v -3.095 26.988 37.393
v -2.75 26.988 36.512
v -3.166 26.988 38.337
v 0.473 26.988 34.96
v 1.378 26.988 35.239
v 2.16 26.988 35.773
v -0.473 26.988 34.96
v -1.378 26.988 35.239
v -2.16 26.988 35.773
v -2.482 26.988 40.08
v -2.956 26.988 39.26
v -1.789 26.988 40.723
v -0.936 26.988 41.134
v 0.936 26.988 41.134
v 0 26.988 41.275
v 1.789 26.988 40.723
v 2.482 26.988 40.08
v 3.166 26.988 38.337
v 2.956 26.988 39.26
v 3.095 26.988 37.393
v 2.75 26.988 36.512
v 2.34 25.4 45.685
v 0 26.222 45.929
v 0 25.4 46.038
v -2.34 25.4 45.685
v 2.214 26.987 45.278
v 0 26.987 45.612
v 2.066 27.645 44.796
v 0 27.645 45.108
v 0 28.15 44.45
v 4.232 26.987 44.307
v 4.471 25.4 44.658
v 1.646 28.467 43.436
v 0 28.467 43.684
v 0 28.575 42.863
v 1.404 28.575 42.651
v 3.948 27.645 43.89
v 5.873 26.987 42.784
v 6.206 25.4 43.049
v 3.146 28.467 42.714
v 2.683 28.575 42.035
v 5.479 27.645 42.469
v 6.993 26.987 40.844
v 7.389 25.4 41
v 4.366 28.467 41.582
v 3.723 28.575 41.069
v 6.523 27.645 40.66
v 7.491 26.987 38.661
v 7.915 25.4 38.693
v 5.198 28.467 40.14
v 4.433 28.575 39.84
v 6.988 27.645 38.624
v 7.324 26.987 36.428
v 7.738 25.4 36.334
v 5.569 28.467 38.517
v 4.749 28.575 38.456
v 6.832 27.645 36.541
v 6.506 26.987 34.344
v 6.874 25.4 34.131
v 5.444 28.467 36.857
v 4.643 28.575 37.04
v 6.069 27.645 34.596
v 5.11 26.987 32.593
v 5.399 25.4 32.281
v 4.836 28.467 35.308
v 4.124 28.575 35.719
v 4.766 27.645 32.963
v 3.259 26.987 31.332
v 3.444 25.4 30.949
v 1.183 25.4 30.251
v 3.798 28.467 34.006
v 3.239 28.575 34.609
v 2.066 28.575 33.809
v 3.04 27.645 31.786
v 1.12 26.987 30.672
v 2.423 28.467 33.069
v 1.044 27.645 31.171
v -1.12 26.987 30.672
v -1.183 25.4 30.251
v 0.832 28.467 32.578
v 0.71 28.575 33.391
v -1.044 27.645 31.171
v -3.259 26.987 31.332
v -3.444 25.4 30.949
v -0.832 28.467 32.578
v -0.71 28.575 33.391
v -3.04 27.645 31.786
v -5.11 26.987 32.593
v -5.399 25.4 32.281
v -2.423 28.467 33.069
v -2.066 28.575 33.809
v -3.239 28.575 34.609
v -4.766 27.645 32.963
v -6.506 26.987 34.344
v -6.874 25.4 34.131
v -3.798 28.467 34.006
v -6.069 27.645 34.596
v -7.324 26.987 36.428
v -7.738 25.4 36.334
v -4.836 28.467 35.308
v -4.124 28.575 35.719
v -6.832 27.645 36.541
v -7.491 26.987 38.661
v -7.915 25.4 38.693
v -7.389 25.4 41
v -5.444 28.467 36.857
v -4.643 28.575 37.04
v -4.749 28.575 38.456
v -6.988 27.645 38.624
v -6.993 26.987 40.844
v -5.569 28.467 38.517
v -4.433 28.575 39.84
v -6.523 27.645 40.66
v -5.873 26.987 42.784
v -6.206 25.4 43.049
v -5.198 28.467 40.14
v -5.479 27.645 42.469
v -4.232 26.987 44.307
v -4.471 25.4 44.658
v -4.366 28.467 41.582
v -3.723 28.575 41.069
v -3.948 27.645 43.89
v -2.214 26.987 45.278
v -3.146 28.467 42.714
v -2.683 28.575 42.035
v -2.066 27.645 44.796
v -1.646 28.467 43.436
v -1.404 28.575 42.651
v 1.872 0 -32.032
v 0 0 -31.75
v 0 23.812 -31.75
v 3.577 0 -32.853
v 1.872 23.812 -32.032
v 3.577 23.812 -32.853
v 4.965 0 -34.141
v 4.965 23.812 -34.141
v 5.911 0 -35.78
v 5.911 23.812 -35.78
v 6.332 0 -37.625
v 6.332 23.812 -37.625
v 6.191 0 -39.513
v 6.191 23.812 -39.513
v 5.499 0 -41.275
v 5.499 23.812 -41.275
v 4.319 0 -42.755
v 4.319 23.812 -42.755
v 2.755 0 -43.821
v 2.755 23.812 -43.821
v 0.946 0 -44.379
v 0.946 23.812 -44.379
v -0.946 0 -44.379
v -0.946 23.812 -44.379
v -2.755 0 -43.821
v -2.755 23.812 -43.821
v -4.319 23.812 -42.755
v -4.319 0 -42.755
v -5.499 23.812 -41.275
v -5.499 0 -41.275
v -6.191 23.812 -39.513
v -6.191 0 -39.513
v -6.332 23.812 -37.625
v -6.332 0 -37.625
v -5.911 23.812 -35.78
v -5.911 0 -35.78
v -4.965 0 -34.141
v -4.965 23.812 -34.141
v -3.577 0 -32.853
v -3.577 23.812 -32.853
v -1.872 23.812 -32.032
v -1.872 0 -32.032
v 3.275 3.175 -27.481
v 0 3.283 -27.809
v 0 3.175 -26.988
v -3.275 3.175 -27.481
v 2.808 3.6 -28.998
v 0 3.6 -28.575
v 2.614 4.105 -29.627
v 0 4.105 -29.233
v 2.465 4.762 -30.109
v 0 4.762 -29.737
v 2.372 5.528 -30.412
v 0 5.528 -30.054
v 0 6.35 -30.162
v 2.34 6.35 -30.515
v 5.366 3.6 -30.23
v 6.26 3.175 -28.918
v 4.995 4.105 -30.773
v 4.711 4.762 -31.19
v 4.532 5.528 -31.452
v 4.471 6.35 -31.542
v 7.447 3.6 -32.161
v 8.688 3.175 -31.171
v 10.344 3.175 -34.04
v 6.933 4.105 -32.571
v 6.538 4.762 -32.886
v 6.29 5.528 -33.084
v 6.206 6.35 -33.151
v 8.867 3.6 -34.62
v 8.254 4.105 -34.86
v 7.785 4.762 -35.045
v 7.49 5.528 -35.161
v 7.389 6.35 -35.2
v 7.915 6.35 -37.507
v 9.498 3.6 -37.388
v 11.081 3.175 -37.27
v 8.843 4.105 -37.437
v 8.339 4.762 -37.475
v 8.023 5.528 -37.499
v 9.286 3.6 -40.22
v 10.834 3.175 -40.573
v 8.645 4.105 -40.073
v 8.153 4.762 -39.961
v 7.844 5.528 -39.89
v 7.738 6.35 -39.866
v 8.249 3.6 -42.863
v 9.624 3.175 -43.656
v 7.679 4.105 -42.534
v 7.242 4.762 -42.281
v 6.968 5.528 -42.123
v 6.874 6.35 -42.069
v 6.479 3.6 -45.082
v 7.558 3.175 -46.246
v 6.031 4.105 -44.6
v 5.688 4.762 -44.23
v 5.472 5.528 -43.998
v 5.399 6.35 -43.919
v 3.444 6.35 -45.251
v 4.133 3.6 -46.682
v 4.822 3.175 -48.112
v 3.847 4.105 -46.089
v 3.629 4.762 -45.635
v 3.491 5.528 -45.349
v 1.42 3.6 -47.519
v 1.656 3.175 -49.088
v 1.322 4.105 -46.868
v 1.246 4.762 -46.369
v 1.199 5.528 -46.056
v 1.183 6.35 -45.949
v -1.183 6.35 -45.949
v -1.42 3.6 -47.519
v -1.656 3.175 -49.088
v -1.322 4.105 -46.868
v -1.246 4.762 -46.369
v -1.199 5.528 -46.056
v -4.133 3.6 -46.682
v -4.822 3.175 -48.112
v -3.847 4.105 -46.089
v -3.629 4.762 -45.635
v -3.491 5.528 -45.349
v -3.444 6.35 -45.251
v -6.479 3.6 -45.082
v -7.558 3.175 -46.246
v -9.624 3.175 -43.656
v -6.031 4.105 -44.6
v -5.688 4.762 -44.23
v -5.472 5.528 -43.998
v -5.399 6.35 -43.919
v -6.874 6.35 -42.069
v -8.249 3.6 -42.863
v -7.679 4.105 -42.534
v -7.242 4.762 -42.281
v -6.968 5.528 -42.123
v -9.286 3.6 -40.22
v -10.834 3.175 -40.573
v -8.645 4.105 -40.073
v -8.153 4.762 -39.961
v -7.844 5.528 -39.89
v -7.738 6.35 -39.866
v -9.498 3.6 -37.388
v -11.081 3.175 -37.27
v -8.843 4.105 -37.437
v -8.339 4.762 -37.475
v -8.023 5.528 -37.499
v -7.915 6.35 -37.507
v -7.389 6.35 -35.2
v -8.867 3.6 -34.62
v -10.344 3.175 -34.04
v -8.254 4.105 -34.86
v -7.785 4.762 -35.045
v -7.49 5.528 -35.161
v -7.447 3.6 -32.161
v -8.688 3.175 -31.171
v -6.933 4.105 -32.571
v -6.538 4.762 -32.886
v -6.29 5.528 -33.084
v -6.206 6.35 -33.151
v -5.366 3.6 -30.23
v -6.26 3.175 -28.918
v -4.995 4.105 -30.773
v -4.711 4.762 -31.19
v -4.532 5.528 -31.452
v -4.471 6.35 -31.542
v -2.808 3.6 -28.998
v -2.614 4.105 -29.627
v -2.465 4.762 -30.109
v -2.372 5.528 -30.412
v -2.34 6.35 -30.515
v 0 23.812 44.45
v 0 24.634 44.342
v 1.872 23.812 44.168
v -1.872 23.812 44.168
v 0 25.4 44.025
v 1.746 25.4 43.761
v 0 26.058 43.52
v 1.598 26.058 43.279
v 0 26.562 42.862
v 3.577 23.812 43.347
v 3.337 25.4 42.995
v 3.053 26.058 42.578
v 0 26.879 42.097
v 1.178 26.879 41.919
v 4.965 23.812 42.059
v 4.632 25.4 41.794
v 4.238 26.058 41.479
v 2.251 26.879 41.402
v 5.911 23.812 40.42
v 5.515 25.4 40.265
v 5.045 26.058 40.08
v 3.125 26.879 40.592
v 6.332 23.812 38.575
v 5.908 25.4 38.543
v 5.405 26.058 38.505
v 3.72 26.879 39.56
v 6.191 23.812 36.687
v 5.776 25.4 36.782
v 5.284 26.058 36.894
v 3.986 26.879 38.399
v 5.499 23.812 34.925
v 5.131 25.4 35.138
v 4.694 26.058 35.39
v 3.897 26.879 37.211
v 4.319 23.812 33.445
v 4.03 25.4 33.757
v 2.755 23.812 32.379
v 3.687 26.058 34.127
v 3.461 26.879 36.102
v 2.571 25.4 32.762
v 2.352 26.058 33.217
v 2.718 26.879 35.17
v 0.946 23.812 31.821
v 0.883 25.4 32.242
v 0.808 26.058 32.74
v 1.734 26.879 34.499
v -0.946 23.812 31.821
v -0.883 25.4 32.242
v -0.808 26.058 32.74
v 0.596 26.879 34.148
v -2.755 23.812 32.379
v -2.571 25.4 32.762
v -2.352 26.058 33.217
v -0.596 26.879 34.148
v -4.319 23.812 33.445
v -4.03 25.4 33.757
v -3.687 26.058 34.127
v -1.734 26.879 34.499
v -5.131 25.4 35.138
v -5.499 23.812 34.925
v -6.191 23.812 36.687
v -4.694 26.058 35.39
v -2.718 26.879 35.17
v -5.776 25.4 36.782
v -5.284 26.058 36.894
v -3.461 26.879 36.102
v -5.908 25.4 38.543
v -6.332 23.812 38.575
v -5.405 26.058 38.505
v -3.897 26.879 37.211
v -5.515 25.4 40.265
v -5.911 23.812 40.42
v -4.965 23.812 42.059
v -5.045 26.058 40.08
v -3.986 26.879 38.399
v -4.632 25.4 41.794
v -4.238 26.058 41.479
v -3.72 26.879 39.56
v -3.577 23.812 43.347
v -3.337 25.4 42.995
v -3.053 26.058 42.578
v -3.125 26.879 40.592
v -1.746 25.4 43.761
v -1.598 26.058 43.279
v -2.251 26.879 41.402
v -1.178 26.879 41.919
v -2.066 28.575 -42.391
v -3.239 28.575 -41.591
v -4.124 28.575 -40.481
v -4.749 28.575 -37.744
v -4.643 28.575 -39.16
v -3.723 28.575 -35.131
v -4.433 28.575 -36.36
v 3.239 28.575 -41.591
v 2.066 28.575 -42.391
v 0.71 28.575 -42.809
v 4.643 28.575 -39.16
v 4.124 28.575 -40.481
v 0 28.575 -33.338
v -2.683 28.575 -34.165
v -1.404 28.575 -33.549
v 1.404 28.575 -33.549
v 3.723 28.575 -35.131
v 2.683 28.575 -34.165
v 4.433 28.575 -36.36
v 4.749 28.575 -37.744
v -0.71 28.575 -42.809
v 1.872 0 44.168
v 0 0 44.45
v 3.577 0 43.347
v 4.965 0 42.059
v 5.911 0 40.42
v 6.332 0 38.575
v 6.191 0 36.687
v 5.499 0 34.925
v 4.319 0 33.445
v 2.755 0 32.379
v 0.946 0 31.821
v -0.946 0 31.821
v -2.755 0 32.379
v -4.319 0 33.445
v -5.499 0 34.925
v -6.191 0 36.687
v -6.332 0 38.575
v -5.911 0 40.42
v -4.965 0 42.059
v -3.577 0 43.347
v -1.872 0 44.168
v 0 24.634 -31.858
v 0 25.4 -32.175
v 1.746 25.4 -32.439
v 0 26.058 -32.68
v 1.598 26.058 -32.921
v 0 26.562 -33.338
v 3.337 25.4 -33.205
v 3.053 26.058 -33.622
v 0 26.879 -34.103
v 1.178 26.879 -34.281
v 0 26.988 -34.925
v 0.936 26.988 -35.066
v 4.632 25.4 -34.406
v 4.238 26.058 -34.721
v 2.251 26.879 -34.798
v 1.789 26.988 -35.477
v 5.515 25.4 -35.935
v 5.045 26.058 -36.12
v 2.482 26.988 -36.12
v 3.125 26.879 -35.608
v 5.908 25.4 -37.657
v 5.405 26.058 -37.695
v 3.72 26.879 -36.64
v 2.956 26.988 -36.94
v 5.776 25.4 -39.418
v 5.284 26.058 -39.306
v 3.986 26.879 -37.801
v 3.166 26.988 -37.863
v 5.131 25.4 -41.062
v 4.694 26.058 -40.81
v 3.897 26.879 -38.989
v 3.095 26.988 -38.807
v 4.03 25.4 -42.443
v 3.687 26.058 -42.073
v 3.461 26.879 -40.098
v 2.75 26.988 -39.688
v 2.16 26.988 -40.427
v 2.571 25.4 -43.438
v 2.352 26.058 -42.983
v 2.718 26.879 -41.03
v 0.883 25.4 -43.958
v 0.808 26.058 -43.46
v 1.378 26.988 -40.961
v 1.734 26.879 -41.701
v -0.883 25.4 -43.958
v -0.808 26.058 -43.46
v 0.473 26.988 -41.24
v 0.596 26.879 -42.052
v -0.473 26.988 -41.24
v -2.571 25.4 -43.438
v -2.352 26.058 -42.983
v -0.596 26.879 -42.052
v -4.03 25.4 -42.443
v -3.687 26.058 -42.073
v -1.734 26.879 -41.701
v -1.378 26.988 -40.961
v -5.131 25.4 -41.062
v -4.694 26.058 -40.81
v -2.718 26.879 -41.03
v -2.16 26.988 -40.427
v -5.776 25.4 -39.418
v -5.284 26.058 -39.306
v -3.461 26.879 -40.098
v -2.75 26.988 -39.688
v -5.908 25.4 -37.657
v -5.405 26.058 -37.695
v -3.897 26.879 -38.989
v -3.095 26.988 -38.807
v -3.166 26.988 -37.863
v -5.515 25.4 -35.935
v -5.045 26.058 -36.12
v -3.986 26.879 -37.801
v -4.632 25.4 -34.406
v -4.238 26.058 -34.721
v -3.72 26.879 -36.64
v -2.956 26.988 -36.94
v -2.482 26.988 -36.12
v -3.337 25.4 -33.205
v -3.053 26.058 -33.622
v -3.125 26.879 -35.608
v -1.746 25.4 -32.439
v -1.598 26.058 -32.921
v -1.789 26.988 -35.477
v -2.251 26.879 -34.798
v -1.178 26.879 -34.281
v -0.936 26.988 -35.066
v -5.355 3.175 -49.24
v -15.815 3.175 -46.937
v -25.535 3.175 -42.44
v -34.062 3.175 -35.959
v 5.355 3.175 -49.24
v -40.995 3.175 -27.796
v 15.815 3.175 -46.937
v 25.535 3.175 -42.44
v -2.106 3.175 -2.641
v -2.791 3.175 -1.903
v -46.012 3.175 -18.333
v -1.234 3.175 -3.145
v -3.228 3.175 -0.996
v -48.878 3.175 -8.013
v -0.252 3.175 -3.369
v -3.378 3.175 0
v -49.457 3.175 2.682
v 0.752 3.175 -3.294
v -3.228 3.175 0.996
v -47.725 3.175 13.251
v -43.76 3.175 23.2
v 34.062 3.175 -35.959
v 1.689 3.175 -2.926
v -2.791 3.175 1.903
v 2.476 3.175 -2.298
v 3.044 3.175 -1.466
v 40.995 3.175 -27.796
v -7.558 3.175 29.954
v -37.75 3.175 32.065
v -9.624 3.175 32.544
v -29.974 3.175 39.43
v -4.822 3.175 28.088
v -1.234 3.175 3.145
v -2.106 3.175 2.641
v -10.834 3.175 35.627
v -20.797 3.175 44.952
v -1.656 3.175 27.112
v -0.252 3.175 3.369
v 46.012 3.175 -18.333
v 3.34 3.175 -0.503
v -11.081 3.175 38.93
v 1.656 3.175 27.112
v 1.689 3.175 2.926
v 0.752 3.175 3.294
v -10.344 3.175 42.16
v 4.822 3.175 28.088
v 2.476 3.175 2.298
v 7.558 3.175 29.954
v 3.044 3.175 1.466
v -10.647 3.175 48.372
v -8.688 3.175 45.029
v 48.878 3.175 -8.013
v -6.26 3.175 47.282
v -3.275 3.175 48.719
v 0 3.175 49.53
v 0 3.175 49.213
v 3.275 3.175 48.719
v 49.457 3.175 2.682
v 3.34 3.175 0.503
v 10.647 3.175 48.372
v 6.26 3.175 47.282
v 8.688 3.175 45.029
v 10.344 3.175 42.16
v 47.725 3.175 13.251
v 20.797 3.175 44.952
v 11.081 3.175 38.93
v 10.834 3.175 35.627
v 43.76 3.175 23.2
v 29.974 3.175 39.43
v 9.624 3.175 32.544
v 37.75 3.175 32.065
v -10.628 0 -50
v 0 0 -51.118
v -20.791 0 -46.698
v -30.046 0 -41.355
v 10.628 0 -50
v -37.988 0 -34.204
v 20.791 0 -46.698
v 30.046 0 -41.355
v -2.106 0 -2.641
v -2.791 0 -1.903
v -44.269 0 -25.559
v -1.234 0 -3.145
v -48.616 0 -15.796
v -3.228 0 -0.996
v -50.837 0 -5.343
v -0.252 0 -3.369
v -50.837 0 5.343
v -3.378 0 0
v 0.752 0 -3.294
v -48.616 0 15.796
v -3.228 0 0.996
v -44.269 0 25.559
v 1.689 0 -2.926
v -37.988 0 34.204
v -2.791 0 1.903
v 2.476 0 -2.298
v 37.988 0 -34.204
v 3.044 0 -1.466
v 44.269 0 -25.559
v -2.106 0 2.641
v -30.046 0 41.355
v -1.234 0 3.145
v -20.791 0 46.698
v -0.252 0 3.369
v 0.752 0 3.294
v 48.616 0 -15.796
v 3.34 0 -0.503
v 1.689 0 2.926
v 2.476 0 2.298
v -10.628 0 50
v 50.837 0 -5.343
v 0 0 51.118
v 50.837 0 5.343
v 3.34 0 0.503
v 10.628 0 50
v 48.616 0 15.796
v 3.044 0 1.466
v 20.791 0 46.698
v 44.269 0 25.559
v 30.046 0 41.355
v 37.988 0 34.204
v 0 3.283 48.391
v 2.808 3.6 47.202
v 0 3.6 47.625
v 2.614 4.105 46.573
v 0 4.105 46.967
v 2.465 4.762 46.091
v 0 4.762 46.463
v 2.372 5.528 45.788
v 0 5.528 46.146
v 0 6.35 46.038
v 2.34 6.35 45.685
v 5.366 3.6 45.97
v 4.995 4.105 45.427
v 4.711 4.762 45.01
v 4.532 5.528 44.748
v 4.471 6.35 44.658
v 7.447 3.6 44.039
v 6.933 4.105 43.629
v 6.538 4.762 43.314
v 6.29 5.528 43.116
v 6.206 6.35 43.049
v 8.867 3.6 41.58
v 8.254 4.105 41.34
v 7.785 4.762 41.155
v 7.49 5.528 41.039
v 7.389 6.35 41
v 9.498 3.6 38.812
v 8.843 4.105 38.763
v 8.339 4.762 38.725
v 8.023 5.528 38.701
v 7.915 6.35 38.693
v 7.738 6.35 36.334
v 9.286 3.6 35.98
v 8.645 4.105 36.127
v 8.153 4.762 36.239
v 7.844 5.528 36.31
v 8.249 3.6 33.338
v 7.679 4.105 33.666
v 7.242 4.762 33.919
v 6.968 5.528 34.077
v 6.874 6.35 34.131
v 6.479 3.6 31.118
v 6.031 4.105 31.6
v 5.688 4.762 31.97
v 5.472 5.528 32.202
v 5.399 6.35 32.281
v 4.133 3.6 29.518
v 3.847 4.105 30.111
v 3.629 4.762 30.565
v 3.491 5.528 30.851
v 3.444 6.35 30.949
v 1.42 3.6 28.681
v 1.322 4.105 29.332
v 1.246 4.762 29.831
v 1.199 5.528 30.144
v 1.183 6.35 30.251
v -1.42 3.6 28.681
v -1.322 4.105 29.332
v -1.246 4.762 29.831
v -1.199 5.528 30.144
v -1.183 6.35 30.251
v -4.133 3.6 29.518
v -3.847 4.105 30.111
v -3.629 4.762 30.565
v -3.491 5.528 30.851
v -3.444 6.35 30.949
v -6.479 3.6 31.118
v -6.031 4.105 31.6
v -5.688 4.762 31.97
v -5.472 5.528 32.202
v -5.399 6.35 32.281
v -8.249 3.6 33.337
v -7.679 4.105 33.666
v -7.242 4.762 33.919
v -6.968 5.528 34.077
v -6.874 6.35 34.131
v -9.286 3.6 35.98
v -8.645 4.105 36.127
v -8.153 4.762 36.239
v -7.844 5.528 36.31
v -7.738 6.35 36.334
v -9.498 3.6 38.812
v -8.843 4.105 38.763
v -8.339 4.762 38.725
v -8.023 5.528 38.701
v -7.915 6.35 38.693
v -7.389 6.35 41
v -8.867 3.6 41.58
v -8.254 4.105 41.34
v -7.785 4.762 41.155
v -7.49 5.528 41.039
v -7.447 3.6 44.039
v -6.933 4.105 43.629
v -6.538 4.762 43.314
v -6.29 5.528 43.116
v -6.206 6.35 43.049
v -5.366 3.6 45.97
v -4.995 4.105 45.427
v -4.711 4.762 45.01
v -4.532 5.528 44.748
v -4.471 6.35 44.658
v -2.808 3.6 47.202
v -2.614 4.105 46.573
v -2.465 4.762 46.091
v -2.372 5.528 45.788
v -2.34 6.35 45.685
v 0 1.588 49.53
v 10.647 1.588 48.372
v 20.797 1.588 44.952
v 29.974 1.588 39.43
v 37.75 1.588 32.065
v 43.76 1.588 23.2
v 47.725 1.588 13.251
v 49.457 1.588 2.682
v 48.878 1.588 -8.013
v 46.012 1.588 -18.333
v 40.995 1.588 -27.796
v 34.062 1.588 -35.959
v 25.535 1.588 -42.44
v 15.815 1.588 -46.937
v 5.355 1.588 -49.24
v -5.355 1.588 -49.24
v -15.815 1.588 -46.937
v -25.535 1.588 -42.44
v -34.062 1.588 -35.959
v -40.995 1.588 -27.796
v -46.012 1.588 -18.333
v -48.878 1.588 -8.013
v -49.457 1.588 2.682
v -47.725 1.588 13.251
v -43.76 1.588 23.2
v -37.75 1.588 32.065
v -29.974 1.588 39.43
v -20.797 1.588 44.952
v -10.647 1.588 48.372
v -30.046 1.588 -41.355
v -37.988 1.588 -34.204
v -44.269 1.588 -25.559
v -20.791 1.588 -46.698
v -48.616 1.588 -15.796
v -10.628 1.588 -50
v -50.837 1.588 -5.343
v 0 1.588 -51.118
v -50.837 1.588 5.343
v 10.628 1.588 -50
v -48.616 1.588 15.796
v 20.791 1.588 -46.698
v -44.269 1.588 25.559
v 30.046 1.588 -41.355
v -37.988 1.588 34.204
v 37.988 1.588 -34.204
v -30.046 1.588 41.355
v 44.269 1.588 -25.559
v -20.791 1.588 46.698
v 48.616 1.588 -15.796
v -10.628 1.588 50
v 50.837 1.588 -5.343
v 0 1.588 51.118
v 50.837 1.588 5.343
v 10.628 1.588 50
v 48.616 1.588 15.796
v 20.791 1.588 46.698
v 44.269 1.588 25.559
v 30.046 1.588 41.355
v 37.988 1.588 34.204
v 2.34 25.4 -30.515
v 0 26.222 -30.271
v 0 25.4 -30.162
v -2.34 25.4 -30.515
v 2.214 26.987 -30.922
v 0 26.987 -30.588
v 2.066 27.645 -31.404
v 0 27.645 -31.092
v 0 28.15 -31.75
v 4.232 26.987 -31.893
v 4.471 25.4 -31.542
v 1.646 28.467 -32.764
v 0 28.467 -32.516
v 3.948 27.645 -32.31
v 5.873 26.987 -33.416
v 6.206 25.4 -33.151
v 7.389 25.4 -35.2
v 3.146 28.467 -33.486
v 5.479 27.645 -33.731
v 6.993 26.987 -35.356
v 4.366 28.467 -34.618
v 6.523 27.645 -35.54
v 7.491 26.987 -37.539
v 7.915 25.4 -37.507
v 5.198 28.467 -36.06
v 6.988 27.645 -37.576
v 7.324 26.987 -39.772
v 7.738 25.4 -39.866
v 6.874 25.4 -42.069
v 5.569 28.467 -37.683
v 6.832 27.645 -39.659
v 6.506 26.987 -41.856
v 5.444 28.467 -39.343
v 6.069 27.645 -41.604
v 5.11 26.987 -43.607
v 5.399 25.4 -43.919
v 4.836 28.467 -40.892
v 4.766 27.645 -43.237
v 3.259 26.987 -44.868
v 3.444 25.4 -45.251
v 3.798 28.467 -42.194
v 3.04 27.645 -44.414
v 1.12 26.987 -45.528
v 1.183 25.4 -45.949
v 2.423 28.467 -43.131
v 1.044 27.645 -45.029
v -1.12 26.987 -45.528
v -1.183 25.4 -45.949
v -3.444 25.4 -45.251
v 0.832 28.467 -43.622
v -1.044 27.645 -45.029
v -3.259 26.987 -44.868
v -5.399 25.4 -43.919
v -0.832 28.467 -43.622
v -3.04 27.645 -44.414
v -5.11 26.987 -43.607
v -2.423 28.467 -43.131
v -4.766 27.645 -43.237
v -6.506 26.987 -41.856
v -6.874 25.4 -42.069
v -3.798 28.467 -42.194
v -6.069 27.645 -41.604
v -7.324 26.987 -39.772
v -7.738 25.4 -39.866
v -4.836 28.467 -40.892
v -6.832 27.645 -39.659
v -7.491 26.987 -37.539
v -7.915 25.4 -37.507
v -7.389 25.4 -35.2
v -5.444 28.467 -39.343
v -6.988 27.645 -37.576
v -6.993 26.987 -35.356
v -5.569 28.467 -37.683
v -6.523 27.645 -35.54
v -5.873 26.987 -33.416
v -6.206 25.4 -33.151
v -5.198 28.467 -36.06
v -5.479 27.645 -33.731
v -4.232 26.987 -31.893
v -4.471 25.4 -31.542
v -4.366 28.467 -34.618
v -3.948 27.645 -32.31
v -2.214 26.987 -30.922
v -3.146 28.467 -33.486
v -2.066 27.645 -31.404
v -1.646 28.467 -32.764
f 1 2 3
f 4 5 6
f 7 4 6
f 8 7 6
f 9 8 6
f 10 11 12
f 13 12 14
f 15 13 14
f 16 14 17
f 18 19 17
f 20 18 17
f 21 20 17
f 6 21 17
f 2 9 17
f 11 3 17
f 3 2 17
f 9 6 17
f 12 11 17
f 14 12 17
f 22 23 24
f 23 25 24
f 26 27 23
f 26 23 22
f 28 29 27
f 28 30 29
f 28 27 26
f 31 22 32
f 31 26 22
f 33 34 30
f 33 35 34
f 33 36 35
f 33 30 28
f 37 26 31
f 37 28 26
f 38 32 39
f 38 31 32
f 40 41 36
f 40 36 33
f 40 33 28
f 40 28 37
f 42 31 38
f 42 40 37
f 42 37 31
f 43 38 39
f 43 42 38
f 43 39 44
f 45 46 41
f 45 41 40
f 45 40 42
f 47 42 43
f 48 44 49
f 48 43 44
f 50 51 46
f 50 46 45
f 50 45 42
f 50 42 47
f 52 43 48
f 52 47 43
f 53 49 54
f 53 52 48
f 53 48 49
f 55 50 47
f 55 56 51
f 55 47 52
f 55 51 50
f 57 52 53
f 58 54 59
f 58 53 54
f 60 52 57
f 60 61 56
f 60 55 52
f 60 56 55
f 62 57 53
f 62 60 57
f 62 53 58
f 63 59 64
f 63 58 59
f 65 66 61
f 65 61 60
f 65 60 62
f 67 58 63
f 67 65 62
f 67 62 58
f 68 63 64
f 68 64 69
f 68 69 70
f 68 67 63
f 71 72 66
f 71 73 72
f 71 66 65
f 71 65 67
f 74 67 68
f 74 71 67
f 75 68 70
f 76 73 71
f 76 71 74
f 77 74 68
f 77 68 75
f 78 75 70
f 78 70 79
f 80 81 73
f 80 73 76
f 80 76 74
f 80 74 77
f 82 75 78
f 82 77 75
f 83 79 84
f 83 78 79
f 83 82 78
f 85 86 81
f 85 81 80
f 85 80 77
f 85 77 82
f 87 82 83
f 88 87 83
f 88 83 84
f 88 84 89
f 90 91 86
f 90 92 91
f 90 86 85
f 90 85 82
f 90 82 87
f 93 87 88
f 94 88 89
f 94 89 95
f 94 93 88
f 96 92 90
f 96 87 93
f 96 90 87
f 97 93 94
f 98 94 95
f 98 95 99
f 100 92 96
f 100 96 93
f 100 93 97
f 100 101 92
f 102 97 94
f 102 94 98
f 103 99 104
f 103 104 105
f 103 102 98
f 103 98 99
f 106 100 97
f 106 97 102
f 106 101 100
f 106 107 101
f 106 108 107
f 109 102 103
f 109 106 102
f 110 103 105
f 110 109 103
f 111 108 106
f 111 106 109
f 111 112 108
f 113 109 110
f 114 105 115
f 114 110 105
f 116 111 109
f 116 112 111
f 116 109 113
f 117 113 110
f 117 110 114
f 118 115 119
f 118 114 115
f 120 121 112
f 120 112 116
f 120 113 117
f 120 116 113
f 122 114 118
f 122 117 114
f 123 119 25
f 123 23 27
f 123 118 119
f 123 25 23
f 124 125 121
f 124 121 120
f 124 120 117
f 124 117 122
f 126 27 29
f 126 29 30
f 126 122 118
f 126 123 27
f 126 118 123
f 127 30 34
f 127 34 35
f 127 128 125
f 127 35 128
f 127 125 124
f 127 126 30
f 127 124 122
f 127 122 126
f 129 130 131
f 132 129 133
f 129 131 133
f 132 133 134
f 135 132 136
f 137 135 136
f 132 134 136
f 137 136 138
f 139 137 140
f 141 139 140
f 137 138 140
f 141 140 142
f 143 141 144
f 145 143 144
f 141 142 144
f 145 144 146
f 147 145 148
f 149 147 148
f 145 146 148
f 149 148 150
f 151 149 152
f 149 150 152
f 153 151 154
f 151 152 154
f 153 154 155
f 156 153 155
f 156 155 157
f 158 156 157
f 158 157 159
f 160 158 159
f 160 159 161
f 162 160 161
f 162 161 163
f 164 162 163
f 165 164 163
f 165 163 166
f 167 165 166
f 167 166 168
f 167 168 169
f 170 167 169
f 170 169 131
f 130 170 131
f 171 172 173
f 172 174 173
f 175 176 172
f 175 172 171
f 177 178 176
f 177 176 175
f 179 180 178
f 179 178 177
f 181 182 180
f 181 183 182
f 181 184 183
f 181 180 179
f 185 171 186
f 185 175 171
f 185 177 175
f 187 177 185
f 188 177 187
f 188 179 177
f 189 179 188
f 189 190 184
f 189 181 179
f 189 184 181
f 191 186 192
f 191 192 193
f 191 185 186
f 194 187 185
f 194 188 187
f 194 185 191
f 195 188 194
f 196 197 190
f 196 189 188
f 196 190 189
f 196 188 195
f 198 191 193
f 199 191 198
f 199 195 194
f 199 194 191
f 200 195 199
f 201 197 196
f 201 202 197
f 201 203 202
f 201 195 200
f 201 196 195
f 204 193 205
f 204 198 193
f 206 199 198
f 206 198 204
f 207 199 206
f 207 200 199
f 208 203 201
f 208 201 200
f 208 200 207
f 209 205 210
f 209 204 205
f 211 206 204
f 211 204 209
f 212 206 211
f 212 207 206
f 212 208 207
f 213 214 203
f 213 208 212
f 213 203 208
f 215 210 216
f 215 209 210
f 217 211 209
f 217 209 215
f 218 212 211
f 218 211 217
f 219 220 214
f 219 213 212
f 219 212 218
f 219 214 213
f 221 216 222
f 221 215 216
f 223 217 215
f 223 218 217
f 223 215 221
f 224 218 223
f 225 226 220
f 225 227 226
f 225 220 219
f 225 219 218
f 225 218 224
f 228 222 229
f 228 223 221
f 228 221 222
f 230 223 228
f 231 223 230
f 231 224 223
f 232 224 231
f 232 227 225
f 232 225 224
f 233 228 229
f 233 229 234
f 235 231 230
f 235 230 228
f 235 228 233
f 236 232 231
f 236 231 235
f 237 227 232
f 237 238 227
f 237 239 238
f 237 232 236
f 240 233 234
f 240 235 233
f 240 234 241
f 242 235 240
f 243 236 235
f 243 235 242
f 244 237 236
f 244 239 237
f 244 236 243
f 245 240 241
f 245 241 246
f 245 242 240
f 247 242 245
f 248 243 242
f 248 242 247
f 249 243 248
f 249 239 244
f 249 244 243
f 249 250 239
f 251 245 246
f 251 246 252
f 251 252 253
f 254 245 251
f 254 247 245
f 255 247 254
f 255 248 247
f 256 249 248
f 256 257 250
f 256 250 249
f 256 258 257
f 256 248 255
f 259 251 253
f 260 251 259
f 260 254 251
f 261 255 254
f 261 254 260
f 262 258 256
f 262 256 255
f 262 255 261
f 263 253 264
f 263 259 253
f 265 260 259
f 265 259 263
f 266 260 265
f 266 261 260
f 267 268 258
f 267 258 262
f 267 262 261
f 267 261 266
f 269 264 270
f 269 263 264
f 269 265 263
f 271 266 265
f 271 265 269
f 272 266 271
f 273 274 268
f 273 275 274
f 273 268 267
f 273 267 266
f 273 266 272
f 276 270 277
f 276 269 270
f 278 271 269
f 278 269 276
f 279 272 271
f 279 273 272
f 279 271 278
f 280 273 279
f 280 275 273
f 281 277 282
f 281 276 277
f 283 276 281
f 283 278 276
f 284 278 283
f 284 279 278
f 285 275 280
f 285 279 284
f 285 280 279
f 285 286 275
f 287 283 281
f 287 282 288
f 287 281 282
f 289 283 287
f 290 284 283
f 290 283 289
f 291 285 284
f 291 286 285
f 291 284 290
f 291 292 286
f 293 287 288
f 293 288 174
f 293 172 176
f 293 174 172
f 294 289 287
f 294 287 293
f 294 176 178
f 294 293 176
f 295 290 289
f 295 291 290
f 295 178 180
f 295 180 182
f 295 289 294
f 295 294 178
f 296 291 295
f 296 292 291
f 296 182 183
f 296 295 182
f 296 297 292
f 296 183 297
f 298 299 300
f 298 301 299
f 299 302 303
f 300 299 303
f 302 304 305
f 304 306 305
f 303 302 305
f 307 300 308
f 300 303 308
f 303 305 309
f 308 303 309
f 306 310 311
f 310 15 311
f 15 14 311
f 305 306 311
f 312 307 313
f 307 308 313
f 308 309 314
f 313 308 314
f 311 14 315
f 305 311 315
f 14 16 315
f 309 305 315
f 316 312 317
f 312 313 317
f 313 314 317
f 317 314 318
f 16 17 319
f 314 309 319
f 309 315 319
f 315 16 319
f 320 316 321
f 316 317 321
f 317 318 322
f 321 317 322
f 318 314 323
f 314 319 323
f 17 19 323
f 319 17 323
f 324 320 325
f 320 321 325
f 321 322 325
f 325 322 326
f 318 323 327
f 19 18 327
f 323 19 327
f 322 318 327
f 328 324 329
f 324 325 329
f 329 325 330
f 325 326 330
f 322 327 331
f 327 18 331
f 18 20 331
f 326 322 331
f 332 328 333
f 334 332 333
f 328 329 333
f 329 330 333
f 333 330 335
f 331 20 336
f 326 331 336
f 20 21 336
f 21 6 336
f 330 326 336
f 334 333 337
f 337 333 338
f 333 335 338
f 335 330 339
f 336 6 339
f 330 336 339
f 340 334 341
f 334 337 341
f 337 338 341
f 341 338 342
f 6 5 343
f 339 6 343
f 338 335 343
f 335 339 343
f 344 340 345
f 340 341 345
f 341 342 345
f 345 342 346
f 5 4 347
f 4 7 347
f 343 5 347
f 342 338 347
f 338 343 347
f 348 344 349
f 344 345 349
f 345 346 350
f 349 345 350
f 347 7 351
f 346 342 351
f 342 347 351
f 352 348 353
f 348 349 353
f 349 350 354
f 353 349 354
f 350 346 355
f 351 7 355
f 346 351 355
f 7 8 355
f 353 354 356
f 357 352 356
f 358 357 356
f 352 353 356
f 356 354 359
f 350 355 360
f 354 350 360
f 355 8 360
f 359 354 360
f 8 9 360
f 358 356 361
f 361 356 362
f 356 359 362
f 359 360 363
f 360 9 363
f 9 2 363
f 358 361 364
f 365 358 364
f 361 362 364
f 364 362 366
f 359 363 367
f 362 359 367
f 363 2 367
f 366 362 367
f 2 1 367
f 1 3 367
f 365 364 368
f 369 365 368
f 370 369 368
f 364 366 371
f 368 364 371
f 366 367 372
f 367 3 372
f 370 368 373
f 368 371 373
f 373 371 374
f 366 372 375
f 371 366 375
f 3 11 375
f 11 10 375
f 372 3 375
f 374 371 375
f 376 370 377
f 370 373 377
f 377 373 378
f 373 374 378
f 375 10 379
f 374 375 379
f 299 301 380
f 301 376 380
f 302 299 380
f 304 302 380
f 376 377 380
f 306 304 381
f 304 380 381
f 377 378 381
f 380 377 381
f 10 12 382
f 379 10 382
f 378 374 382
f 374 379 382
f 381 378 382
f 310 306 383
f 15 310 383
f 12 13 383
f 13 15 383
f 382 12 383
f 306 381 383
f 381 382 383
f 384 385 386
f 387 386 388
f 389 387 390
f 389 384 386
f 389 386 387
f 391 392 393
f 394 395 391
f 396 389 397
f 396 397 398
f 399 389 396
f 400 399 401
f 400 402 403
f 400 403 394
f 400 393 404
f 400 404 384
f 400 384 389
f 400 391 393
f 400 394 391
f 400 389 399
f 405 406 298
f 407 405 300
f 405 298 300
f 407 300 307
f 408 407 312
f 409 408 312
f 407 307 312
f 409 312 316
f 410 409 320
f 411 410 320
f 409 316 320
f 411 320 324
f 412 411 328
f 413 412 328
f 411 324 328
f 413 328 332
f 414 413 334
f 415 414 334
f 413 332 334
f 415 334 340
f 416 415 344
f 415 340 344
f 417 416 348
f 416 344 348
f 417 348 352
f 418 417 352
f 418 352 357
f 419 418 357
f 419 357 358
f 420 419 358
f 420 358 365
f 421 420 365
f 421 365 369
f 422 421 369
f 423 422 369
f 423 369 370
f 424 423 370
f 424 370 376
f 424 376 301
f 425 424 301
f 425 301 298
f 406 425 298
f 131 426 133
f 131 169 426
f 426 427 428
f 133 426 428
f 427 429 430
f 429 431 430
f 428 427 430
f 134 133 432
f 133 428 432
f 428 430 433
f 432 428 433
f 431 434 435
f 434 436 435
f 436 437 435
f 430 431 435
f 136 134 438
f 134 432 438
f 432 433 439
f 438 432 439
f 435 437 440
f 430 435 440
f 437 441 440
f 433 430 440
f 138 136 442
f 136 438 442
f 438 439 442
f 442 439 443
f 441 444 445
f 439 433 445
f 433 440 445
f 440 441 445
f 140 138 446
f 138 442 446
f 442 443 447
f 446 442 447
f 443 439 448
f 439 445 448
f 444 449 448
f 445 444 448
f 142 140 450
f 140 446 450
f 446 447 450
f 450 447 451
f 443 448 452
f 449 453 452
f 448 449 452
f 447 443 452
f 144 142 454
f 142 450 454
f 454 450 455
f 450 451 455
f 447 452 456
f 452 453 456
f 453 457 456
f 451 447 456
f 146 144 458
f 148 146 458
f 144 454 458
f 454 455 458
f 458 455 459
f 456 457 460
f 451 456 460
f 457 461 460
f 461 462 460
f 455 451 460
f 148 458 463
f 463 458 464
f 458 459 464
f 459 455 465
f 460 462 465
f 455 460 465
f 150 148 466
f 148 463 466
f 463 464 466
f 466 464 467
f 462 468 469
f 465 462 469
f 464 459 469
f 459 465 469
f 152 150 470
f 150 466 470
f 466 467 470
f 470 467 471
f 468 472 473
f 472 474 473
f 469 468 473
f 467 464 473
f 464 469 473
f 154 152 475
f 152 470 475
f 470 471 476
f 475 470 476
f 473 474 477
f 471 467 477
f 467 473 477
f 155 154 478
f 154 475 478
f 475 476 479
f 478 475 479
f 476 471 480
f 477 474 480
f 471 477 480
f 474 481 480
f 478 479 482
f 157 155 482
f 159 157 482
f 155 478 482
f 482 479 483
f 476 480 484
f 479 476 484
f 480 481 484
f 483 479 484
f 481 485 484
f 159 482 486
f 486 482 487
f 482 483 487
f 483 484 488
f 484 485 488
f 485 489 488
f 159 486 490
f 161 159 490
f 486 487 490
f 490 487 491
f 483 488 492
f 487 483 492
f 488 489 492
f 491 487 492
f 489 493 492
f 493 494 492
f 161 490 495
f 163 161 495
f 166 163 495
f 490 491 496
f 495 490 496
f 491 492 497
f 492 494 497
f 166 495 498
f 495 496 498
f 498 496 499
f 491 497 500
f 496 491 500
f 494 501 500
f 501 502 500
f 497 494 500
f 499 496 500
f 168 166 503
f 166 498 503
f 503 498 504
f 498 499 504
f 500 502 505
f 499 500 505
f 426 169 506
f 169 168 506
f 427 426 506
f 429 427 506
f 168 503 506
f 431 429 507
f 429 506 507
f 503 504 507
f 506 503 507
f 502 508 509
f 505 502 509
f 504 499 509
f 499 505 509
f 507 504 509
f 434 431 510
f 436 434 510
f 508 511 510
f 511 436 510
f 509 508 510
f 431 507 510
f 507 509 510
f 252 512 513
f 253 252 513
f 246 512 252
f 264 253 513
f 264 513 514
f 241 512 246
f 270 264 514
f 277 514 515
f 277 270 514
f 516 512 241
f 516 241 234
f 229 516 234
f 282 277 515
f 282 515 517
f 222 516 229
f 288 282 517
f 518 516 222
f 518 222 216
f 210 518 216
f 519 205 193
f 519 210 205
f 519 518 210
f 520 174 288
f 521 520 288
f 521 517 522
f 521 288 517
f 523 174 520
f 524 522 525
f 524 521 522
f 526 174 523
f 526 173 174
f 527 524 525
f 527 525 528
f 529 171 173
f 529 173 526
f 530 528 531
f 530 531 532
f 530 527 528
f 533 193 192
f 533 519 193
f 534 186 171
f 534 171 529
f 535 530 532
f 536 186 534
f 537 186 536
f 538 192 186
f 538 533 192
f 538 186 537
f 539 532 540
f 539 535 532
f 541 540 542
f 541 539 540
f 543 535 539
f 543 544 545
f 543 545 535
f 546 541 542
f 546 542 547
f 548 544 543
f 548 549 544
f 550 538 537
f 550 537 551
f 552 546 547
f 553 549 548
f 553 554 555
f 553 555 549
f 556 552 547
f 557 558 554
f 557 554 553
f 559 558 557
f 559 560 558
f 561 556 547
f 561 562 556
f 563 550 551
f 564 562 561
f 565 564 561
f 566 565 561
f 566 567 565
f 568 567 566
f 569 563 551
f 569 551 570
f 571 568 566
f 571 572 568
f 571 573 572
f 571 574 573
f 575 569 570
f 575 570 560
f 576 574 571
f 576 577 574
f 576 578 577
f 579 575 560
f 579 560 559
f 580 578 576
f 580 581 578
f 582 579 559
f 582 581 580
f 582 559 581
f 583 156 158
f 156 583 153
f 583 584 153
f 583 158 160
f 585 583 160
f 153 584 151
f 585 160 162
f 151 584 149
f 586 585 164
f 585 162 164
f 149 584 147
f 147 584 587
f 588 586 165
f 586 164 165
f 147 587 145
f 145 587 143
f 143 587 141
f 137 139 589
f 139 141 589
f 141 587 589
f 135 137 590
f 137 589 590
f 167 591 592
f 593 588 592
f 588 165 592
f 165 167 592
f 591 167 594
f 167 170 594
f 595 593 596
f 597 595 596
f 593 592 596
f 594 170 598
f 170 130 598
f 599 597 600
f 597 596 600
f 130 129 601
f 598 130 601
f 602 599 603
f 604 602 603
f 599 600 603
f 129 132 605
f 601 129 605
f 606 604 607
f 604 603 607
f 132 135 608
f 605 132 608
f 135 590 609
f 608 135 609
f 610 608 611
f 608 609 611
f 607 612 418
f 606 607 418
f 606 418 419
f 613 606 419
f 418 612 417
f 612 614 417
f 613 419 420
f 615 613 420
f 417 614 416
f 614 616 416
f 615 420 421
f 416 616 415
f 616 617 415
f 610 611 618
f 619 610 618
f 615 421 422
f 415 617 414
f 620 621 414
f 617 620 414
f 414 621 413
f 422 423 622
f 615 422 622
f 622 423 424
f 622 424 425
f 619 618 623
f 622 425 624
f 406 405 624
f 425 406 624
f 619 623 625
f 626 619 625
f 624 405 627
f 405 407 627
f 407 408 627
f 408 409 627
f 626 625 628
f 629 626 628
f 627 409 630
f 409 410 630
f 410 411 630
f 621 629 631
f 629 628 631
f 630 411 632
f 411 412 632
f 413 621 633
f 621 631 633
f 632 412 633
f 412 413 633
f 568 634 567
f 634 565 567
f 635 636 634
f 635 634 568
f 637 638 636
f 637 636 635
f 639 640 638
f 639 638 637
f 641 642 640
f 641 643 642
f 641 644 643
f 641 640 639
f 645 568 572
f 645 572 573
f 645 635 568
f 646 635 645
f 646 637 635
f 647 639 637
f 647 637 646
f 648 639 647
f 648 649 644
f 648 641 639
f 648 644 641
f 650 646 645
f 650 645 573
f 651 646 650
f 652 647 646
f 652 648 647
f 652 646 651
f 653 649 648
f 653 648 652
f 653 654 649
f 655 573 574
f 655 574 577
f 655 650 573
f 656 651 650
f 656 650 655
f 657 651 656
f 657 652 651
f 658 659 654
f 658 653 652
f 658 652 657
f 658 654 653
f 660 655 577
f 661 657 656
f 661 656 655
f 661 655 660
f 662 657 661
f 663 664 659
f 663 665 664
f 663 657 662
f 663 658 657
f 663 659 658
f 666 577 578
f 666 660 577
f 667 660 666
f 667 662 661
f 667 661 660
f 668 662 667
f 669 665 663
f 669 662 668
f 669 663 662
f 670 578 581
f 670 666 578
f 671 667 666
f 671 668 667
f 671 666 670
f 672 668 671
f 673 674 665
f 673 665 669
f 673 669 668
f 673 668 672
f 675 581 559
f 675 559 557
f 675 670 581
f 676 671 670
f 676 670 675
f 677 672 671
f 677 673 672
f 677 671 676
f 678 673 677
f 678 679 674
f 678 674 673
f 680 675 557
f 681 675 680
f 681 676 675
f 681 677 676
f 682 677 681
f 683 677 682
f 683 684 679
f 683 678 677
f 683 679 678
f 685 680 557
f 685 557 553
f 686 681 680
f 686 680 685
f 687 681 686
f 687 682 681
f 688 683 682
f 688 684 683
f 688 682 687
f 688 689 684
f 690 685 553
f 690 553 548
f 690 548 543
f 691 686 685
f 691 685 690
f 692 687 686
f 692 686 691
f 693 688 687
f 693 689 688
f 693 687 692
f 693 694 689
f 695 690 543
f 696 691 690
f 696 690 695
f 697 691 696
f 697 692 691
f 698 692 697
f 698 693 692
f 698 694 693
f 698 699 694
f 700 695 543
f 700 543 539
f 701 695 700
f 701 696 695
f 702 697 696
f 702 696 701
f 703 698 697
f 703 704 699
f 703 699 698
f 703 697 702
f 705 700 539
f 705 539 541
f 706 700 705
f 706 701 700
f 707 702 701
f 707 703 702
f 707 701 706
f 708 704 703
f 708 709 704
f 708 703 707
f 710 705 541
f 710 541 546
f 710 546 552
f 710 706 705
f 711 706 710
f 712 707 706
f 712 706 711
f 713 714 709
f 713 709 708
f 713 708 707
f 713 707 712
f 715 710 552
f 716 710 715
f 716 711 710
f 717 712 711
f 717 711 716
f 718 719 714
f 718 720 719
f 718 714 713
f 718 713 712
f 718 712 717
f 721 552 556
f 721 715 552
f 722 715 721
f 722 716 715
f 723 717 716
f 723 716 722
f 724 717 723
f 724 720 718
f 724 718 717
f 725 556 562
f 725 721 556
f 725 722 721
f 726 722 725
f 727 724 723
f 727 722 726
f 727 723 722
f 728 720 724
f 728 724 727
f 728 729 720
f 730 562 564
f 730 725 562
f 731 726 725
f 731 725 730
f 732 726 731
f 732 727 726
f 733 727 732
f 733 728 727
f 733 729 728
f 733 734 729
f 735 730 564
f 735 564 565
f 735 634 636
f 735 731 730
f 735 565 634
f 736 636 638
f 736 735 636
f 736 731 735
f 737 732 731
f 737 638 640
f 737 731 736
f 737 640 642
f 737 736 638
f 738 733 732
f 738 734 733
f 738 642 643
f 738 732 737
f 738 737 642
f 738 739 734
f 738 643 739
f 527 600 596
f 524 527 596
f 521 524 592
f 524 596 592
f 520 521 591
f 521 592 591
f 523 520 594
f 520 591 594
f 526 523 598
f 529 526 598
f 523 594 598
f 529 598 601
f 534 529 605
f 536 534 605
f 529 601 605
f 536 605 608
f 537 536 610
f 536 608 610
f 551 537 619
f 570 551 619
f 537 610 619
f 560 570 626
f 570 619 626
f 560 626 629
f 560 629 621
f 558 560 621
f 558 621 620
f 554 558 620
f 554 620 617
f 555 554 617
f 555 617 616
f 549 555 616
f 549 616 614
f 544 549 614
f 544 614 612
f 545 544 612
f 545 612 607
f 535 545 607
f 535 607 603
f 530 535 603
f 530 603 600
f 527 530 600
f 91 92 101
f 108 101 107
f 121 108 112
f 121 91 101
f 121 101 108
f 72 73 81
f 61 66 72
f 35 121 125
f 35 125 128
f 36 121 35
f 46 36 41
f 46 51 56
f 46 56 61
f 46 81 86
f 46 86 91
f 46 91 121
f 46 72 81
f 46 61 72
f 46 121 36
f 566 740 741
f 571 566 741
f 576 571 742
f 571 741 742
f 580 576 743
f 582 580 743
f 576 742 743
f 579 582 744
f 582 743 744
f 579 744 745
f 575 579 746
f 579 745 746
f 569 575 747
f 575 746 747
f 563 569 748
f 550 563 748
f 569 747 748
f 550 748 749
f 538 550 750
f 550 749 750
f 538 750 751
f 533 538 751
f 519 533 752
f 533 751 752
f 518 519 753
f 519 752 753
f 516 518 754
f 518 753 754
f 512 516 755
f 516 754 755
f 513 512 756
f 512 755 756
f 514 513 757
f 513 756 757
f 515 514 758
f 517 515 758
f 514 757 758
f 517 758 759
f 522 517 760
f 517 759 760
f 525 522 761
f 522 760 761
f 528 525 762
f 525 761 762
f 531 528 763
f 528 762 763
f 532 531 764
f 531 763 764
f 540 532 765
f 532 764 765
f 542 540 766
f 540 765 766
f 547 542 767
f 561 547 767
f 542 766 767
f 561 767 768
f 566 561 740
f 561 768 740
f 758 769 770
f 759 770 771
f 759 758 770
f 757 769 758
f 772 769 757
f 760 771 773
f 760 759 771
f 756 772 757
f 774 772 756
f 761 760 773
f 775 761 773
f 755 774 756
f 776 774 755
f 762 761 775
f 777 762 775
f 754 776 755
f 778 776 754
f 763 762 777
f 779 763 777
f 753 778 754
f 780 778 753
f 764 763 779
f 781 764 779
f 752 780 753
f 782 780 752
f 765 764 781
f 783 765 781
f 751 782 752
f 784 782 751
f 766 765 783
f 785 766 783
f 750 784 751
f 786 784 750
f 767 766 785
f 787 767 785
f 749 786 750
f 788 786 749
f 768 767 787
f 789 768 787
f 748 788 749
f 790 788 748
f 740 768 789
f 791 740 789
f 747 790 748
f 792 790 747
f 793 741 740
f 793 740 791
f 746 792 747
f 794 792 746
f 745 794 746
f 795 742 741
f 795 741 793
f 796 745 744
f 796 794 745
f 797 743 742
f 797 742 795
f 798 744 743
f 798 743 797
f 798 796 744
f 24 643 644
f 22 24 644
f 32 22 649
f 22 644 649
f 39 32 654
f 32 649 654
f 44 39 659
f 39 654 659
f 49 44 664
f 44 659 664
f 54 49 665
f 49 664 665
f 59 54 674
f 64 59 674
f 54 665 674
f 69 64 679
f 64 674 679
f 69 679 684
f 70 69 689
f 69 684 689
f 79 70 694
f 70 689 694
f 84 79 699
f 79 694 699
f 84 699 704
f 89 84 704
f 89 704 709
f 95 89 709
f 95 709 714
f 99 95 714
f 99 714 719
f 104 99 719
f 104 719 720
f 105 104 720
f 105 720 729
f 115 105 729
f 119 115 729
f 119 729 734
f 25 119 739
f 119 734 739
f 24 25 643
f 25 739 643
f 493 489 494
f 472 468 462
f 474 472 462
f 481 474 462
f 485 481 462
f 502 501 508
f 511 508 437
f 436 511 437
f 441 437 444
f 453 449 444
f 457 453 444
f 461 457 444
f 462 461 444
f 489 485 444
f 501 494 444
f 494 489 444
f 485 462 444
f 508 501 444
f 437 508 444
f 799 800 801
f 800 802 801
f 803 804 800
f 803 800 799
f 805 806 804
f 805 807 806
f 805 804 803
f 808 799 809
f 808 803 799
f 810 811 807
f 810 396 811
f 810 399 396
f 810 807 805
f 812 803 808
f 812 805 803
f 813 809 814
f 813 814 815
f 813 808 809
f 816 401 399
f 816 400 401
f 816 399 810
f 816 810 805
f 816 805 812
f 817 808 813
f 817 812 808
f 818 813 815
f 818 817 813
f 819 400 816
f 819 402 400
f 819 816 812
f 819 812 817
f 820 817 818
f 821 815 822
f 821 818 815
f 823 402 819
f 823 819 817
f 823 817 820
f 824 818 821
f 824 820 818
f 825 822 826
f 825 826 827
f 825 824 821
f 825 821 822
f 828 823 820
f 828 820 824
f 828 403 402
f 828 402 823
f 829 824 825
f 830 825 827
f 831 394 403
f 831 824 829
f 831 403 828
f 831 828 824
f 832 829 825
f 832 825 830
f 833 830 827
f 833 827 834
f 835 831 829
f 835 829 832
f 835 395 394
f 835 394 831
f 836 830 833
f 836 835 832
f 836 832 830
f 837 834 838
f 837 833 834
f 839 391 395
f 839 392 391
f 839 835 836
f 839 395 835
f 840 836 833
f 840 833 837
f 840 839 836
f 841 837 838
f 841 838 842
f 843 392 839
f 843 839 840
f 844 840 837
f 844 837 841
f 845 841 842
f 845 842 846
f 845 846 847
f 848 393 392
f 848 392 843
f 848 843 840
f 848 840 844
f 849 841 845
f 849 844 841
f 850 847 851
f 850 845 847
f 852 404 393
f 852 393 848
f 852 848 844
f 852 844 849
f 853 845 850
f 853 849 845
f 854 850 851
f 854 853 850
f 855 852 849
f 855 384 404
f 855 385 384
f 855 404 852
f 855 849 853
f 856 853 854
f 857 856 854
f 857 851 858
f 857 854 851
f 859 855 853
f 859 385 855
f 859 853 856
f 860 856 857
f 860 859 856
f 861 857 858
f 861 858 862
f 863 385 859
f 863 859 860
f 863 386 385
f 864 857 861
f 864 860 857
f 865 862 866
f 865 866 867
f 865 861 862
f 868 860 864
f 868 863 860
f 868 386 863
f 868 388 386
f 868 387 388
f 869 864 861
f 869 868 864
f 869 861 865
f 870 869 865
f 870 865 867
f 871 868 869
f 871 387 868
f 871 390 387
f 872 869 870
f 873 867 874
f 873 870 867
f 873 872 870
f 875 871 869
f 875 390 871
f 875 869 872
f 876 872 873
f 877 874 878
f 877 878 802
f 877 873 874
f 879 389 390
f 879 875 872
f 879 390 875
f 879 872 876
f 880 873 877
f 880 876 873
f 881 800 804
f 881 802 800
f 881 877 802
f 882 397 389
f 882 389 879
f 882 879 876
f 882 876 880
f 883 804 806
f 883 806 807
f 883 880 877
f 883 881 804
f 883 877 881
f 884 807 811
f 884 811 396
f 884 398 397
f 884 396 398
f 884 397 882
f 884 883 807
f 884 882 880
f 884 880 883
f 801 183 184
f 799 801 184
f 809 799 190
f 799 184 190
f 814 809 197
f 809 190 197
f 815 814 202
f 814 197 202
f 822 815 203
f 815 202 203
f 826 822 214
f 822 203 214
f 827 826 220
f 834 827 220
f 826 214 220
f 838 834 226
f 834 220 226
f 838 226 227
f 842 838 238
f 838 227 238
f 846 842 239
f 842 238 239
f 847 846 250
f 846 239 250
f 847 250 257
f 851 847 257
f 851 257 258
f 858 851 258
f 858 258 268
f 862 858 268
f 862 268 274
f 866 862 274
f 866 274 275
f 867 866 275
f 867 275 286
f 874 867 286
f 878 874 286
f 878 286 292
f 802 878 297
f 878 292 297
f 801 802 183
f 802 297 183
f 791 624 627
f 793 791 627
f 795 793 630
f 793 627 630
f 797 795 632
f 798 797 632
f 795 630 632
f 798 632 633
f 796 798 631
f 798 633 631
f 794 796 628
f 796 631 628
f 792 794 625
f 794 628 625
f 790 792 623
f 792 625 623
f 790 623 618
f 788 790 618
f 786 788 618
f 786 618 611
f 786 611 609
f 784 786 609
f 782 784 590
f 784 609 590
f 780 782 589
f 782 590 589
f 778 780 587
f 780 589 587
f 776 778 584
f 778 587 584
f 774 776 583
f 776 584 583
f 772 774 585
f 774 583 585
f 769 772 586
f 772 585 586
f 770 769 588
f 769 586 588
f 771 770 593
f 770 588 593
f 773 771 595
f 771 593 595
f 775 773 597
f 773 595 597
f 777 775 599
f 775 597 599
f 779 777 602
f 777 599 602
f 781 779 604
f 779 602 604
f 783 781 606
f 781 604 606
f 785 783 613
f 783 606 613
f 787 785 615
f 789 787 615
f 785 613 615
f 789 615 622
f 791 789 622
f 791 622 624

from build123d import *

# Parameters (mm, degrees)
SKETCH1_R                   = 51.1175
BOSS_EXTRUDE1_DEPTH         = 1.5875
SKETCH2_R                   = 49.53
BOSS_EXTRUDE2_DEPTH         = 1.5875
F_1_4_CLEARANCE_HOLE1_D     = 6.7564
F_1_4_CLEARANCE_HOLE1_DEPTH = 25.4
F_1_4_CLEARANCE_HOLE1_TIP   = 2.029827343
SKETCH8_R                   = 7.9375
BOSS_EXTRUDE4_DEPTH         = 25.4
CUT_EXTRUDE2_START          = -1.5875
SKETCH11_R                  = 6.35
CUT_EXTRUDE2_DEPTH          = 77.146200784
FILLET1_R                   = 3.175


with BuildPart() as part:
    # Sketch1 → Boss-Extrude1 (new body)
    with BuildSketch(Plane(origin=(0, 0, 0), x_dir=(1, 0, 0), z_dir=(0, 1, 0))):
        with Locations(Location((0, 0, 0), (0, 0, 270))):
            Circle(SKETCH1_R)
    extrude(amount=BOSS_EXTRUDE1_DEPTH)

    # Sketch2 → Boss-Extrude2 (add)
    with BuildSketch(Plane(origin=(0, 1.5875, 0), x_dir=(1, 0, 0), z_dir=(0, 1, 0))):
        with Locations(Location((0, 0, 0), (0, 0, 270))):
            Circle(SKETCH2_R)
    extrude(amount=BOSS_EXTRUDE2_DEPTH)

    # 1/4 Clearance Hole1
    with Locations(Plane(origin=(0, 3.175, 0), x_dir=(1, 0, 0), z_dir=(0, 1, 0))):
        with Locations((0, 0)):
            Hole(F_1_4_CLEARANCE_HOLE1_D / 2, depth=F_1_4_CLEARANCE_HOLE1_DEPTH)
            with Locations((0, 0, -(F_1_4_CLEARANCE_HOLE1_DEPTH + F_1_4_CLEARANCE_HOLE1_TIP / 2))):  # 118° drill point
                Cone(0, F_1_4_CLEARANCE_HOLE1_D / 2, F_1_4_CLEARANCE_HOLE1_TIP, mode=Mode.SUBTRACT)

    # Sketch8 → Boss-Extrude4 (add)
    with BuildSketch(Plane(origin=(0, 3.175, 0), x_dir=(1, 0, 0), z_dir=(0, 1, 0))):
        with Locations(Location((0, 38.1, 0), (0, 0, 270))):
            Circle(SKETCH8_R)
        with Locations(Location((0, -38.1, 0), (0, 0, 270))):
            Circle(SKETCH8_R)
    extrude(amount=BOSS_EXTRUDE4_DEPTH)

    # Sketch11 → Cut-Extrude2 (cut, through all)
    with BuildSketch(Plane(origin=(0, 28.575, 0), x_dir=(1, 0, 0), z_dir=(0, 1, 0)).offset(CUT_EXTRUDE2_START)):
        with Locations(Location((0, -38.1, 0), (0, 0, 270))):
            Circle(SKETCH11_R)
        with Locations(Location((0, 38.1, 0), (0, 0, 270))):
            Circle(SKETCH11_R)
    extrude(amount=-CUT_EXTRUDE2_DEPTH, mode=Mode.SUBTRACT)

    # Fillet1
    fillet1_edges = [part.edges().sort_by_distance(p)[0] for p in [
        (0, 3.175, -46.0375),
        (0, 28.575, -46.0375),
        (0, 3.175, 30.1625),
        (0, 28.575, 30.1625),
        (0, 26.9875, 31.75),
        (0, 26.9875, -44.45),
    ]]
    fillet(fillet1_edges, radius=FILLET1_R)


solid = part.part
